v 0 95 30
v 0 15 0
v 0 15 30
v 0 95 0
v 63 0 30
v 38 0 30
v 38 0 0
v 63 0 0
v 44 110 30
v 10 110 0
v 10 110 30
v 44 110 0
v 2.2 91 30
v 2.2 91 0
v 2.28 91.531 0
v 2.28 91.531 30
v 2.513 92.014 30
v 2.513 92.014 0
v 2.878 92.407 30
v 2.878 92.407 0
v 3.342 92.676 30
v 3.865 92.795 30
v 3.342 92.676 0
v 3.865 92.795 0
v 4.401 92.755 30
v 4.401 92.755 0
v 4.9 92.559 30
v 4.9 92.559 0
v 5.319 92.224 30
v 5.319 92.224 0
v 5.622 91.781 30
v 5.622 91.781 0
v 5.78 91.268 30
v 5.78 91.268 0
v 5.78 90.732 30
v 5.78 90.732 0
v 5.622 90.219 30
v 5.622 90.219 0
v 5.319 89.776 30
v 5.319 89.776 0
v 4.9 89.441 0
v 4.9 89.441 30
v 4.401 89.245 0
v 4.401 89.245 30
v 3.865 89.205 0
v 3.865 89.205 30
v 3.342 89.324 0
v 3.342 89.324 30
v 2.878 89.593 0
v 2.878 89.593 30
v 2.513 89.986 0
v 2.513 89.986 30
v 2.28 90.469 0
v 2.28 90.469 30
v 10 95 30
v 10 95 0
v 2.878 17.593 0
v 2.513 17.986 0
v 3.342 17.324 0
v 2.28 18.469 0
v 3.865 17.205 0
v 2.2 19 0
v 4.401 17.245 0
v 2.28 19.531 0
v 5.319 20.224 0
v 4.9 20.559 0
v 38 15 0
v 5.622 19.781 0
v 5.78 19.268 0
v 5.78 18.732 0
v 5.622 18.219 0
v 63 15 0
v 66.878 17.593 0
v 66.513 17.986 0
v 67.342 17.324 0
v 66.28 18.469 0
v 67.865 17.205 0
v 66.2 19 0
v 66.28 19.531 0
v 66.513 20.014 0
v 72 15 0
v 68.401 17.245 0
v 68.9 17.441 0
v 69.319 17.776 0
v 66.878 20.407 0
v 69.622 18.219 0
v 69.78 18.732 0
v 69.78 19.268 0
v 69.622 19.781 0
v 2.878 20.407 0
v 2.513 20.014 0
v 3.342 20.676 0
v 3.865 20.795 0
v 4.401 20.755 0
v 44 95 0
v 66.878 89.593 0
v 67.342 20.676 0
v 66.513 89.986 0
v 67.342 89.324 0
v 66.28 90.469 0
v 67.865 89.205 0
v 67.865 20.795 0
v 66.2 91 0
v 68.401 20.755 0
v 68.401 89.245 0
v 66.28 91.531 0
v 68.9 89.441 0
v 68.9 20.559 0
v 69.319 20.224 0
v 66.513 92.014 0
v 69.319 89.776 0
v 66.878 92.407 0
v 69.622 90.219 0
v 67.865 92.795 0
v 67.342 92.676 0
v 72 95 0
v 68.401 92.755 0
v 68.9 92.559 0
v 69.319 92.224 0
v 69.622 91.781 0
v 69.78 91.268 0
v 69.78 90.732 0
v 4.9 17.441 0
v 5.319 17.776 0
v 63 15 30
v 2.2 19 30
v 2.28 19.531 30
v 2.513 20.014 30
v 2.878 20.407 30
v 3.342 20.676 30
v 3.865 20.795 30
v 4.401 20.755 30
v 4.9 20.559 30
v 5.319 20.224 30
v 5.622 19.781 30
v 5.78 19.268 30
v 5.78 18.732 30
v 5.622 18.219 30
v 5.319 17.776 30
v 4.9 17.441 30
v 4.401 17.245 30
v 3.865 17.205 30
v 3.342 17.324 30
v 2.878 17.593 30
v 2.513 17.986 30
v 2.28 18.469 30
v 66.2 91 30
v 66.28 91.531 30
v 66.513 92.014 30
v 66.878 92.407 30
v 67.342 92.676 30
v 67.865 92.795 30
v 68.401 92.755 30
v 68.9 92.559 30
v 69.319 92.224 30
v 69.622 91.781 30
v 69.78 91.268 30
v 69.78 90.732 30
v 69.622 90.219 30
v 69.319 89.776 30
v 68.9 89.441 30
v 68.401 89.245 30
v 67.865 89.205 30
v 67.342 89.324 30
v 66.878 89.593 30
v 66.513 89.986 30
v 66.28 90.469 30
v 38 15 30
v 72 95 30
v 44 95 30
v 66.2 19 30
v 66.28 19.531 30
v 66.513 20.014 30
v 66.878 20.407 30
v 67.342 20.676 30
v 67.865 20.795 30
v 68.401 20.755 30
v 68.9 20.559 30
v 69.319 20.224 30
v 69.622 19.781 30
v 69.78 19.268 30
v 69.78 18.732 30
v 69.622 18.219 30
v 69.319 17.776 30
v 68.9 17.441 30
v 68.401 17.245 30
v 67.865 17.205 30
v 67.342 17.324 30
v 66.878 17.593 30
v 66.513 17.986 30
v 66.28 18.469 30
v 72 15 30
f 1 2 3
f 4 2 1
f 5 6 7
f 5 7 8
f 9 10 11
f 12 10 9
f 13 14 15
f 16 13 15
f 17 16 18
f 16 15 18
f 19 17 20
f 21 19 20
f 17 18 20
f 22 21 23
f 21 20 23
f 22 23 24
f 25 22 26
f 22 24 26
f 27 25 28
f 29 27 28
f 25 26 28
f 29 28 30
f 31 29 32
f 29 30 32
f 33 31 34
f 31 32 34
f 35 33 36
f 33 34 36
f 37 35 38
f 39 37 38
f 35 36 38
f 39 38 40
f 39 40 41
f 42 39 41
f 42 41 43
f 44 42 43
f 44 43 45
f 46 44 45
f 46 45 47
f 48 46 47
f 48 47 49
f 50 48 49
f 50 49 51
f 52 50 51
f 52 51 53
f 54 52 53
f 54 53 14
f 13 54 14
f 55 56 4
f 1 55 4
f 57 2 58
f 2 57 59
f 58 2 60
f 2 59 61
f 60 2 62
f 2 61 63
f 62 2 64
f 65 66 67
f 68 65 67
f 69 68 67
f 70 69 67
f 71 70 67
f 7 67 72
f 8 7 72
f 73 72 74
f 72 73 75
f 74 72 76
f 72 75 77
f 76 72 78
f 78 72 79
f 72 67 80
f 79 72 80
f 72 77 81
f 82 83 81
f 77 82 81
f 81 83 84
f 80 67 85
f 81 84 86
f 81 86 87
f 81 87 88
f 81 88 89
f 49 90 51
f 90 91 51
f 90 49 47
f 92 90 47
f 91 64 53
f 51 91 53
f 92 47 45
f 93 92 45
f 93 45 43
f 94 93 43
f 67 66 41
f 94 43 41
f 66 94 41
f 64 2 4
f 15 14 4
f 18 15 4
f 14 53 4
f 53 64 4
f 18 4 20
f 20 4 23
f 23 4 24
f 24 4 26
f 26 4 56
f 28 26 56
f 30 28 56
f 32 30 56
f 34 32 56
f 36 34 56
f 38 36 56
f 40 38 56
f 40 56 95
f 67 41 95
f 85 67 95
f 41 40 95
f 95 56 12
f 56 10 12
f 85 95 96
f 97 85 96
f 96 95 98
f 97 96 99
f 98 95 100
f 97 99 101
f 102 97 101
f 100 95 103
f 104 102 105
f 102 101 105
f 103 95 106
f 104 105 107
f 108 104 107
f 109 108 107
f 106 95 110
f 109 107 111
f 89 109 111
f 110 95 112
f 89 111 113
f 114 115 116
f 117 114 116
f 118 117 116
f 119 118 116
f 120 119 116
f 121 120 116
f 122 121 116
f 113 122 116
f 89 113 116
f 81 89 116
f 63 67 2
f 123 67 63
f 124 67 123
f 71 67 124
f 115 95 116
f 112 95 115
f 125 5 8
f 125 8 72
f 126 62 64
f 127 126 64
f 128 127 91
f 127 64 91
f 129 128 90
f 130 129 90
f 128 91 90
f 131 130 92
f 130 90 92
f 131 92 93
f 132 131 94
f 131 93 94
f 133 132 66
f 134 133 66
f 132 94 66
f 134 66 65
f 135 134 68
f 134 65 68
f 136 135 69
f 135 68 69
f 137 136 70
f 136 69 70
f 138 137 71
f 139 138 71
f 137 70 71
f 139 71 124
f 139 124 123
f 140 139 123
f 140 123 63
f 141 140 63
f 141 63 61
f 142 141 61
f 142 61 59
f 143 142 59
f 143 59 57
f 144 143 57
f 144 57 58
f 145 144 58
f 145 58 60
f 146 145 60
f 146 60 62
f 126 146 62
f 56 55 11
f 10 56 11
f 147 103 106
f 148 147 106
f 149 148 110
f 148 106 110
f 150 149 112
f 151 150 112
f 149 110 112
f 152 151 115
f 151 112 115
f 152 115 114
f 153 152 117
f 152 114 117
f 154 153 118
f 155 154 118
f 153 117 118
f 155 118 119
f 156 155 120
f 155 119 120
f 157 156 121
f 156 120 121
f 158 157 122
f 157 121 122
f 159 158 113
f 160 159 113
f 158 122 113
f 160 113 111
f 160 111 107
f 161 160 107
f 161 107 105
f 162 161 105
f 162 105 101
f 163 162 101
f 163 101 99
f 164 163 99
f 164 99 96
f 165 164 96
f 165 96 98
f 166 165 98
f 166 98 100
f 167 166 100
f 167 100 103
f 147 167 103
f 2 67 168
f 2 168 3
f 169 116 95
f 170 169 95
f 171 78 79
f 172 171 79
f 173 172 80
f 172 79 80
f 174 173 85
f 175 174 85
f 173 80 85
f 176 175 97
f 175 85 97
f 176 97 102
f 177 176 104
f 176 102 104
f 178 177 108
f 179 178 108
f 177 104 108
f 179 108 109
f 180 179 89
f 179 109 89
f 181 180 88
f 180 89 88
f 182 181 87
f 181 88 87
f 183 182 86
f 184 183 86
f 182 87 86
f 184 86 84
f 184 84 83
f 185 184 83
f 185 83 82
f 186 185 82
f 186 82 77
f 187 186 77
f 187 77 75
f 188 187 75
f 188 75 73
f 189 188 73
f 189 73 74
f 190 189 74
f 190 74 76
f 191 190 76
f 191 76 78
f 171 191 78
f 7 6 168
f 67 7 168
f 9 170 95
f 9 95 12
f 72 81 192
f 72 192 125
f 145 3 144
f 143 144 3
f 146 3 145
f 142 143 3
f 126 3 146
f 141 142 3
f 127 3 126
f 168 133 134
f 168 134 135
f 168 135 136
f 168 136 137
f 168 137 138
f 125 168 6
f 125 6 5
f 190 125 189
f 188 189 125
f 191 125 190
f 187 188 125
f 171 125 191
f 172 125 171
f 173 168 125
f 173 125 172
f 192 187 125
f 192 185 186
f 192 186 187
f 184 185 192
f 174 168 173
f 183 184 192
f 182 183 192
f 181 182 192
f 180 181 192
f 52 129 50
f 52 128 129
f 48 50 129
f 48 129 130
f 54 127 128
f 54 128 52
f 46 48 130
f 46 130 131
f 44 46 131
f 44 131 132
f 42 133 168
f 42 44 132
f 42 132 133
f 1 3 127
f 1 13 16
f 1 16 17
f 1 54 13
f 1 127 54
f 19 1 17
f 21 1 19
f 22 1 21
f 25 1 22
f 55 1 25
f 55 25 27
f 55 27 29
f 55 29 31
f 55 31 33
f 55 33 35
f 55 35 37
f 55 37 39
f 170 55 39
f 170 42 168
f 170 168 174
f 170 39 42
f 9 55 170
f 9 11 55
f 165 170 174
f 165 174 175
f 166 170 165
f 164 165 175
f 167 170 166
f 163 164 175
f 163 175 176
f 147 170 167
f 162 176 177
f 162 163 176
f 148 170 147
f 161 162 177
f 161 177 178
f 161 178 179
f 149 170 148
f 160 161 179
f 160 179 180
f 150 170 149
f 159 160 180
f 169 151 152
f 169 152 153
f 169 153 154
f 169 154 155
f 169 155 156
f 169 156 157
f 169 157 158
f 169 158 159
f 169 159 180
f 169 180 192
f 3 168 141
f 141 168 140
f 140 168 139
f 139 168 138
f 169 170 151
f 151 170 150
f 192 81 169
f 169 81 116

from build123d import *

# Parameters (mm, degrees)
ESQUISSE1_W             = 72
ESQUISSE1_H             = 110
BOSS_EXTRU_1_DEPTH      = 30
D_GAGEMENT_M31_D        = 3.6
ESQUISSE5_W             = 10
ESQUISSE5_H             = 15
ESQUISSE5_W_2           = 38
ENL_V_MAT_EXTRU_1_DEPTH = 30
ESQUISSE6_W             = 28
ESQUISSE6_H             = 15
ESQUISSE6_W_2           = 9
ENL_V_MAT_EXTRU_2_DEPTH = 30


with BuildPart() as part:
    # Esquisse1 → Boss.-Extru.1 (new body)
    with BuildSketch(Plane.XY):
        with Locations((36, 55)):
            Rectangle(ESQUISSE1_W, ESQUISSE1_H)
    extrude(amount=BOSS_EXTRU_1_DEPTH)

    # Dégagement M31 (through all)
    with Locations(Plane.XY.offset(30)):
        with Locations((4, 91), (68, 91), (4, 19), (68, 19)):
            Hole(D_GAGEMENT_M31_D / 2)

    # Esquisse5 → Enlèv. mat.-Extru.1 (cut)
    with BuildSketch(Plane(origin=(0, 0, 0), x_dir=(-1, 0, 0), z_dir=(0, 0, -1))):
        with Locations((-5, 102.5)):
            Rectangle(ESQUISSE5_W, ESQUISSE5_H)
        with Locations((-19, 7.5)):
            Rectangle(ESQUISSE5_W_2, ESQUISSE5_H)
    extrude(amount=-ENL_V_MAT_EXTRU_1_DEPTH, mode=Mode.SUBTRACT)

    # Esquisse6 → Enlèv. mat.-Extru.2 (cut)
    with BuildSketch(Plane(origin=(0, 0, 0), x_dir=(-1, 0, 0), z_dir=(0, 0, -1))):
        with Locations((-58, 102.5)):
            Rectangle(ESQUISSE6_W, ESQUISSE6_H)
        with Locations((-67.5, 7.5)):
            Rectangle(ESQUISSE6_W_2, ESQUISSE6_H)
    extrude(amount=-ENL_V_MAT_EXTRU_2_DEPTH, mode=Mode.SUBTRACT)


solid = part.part
